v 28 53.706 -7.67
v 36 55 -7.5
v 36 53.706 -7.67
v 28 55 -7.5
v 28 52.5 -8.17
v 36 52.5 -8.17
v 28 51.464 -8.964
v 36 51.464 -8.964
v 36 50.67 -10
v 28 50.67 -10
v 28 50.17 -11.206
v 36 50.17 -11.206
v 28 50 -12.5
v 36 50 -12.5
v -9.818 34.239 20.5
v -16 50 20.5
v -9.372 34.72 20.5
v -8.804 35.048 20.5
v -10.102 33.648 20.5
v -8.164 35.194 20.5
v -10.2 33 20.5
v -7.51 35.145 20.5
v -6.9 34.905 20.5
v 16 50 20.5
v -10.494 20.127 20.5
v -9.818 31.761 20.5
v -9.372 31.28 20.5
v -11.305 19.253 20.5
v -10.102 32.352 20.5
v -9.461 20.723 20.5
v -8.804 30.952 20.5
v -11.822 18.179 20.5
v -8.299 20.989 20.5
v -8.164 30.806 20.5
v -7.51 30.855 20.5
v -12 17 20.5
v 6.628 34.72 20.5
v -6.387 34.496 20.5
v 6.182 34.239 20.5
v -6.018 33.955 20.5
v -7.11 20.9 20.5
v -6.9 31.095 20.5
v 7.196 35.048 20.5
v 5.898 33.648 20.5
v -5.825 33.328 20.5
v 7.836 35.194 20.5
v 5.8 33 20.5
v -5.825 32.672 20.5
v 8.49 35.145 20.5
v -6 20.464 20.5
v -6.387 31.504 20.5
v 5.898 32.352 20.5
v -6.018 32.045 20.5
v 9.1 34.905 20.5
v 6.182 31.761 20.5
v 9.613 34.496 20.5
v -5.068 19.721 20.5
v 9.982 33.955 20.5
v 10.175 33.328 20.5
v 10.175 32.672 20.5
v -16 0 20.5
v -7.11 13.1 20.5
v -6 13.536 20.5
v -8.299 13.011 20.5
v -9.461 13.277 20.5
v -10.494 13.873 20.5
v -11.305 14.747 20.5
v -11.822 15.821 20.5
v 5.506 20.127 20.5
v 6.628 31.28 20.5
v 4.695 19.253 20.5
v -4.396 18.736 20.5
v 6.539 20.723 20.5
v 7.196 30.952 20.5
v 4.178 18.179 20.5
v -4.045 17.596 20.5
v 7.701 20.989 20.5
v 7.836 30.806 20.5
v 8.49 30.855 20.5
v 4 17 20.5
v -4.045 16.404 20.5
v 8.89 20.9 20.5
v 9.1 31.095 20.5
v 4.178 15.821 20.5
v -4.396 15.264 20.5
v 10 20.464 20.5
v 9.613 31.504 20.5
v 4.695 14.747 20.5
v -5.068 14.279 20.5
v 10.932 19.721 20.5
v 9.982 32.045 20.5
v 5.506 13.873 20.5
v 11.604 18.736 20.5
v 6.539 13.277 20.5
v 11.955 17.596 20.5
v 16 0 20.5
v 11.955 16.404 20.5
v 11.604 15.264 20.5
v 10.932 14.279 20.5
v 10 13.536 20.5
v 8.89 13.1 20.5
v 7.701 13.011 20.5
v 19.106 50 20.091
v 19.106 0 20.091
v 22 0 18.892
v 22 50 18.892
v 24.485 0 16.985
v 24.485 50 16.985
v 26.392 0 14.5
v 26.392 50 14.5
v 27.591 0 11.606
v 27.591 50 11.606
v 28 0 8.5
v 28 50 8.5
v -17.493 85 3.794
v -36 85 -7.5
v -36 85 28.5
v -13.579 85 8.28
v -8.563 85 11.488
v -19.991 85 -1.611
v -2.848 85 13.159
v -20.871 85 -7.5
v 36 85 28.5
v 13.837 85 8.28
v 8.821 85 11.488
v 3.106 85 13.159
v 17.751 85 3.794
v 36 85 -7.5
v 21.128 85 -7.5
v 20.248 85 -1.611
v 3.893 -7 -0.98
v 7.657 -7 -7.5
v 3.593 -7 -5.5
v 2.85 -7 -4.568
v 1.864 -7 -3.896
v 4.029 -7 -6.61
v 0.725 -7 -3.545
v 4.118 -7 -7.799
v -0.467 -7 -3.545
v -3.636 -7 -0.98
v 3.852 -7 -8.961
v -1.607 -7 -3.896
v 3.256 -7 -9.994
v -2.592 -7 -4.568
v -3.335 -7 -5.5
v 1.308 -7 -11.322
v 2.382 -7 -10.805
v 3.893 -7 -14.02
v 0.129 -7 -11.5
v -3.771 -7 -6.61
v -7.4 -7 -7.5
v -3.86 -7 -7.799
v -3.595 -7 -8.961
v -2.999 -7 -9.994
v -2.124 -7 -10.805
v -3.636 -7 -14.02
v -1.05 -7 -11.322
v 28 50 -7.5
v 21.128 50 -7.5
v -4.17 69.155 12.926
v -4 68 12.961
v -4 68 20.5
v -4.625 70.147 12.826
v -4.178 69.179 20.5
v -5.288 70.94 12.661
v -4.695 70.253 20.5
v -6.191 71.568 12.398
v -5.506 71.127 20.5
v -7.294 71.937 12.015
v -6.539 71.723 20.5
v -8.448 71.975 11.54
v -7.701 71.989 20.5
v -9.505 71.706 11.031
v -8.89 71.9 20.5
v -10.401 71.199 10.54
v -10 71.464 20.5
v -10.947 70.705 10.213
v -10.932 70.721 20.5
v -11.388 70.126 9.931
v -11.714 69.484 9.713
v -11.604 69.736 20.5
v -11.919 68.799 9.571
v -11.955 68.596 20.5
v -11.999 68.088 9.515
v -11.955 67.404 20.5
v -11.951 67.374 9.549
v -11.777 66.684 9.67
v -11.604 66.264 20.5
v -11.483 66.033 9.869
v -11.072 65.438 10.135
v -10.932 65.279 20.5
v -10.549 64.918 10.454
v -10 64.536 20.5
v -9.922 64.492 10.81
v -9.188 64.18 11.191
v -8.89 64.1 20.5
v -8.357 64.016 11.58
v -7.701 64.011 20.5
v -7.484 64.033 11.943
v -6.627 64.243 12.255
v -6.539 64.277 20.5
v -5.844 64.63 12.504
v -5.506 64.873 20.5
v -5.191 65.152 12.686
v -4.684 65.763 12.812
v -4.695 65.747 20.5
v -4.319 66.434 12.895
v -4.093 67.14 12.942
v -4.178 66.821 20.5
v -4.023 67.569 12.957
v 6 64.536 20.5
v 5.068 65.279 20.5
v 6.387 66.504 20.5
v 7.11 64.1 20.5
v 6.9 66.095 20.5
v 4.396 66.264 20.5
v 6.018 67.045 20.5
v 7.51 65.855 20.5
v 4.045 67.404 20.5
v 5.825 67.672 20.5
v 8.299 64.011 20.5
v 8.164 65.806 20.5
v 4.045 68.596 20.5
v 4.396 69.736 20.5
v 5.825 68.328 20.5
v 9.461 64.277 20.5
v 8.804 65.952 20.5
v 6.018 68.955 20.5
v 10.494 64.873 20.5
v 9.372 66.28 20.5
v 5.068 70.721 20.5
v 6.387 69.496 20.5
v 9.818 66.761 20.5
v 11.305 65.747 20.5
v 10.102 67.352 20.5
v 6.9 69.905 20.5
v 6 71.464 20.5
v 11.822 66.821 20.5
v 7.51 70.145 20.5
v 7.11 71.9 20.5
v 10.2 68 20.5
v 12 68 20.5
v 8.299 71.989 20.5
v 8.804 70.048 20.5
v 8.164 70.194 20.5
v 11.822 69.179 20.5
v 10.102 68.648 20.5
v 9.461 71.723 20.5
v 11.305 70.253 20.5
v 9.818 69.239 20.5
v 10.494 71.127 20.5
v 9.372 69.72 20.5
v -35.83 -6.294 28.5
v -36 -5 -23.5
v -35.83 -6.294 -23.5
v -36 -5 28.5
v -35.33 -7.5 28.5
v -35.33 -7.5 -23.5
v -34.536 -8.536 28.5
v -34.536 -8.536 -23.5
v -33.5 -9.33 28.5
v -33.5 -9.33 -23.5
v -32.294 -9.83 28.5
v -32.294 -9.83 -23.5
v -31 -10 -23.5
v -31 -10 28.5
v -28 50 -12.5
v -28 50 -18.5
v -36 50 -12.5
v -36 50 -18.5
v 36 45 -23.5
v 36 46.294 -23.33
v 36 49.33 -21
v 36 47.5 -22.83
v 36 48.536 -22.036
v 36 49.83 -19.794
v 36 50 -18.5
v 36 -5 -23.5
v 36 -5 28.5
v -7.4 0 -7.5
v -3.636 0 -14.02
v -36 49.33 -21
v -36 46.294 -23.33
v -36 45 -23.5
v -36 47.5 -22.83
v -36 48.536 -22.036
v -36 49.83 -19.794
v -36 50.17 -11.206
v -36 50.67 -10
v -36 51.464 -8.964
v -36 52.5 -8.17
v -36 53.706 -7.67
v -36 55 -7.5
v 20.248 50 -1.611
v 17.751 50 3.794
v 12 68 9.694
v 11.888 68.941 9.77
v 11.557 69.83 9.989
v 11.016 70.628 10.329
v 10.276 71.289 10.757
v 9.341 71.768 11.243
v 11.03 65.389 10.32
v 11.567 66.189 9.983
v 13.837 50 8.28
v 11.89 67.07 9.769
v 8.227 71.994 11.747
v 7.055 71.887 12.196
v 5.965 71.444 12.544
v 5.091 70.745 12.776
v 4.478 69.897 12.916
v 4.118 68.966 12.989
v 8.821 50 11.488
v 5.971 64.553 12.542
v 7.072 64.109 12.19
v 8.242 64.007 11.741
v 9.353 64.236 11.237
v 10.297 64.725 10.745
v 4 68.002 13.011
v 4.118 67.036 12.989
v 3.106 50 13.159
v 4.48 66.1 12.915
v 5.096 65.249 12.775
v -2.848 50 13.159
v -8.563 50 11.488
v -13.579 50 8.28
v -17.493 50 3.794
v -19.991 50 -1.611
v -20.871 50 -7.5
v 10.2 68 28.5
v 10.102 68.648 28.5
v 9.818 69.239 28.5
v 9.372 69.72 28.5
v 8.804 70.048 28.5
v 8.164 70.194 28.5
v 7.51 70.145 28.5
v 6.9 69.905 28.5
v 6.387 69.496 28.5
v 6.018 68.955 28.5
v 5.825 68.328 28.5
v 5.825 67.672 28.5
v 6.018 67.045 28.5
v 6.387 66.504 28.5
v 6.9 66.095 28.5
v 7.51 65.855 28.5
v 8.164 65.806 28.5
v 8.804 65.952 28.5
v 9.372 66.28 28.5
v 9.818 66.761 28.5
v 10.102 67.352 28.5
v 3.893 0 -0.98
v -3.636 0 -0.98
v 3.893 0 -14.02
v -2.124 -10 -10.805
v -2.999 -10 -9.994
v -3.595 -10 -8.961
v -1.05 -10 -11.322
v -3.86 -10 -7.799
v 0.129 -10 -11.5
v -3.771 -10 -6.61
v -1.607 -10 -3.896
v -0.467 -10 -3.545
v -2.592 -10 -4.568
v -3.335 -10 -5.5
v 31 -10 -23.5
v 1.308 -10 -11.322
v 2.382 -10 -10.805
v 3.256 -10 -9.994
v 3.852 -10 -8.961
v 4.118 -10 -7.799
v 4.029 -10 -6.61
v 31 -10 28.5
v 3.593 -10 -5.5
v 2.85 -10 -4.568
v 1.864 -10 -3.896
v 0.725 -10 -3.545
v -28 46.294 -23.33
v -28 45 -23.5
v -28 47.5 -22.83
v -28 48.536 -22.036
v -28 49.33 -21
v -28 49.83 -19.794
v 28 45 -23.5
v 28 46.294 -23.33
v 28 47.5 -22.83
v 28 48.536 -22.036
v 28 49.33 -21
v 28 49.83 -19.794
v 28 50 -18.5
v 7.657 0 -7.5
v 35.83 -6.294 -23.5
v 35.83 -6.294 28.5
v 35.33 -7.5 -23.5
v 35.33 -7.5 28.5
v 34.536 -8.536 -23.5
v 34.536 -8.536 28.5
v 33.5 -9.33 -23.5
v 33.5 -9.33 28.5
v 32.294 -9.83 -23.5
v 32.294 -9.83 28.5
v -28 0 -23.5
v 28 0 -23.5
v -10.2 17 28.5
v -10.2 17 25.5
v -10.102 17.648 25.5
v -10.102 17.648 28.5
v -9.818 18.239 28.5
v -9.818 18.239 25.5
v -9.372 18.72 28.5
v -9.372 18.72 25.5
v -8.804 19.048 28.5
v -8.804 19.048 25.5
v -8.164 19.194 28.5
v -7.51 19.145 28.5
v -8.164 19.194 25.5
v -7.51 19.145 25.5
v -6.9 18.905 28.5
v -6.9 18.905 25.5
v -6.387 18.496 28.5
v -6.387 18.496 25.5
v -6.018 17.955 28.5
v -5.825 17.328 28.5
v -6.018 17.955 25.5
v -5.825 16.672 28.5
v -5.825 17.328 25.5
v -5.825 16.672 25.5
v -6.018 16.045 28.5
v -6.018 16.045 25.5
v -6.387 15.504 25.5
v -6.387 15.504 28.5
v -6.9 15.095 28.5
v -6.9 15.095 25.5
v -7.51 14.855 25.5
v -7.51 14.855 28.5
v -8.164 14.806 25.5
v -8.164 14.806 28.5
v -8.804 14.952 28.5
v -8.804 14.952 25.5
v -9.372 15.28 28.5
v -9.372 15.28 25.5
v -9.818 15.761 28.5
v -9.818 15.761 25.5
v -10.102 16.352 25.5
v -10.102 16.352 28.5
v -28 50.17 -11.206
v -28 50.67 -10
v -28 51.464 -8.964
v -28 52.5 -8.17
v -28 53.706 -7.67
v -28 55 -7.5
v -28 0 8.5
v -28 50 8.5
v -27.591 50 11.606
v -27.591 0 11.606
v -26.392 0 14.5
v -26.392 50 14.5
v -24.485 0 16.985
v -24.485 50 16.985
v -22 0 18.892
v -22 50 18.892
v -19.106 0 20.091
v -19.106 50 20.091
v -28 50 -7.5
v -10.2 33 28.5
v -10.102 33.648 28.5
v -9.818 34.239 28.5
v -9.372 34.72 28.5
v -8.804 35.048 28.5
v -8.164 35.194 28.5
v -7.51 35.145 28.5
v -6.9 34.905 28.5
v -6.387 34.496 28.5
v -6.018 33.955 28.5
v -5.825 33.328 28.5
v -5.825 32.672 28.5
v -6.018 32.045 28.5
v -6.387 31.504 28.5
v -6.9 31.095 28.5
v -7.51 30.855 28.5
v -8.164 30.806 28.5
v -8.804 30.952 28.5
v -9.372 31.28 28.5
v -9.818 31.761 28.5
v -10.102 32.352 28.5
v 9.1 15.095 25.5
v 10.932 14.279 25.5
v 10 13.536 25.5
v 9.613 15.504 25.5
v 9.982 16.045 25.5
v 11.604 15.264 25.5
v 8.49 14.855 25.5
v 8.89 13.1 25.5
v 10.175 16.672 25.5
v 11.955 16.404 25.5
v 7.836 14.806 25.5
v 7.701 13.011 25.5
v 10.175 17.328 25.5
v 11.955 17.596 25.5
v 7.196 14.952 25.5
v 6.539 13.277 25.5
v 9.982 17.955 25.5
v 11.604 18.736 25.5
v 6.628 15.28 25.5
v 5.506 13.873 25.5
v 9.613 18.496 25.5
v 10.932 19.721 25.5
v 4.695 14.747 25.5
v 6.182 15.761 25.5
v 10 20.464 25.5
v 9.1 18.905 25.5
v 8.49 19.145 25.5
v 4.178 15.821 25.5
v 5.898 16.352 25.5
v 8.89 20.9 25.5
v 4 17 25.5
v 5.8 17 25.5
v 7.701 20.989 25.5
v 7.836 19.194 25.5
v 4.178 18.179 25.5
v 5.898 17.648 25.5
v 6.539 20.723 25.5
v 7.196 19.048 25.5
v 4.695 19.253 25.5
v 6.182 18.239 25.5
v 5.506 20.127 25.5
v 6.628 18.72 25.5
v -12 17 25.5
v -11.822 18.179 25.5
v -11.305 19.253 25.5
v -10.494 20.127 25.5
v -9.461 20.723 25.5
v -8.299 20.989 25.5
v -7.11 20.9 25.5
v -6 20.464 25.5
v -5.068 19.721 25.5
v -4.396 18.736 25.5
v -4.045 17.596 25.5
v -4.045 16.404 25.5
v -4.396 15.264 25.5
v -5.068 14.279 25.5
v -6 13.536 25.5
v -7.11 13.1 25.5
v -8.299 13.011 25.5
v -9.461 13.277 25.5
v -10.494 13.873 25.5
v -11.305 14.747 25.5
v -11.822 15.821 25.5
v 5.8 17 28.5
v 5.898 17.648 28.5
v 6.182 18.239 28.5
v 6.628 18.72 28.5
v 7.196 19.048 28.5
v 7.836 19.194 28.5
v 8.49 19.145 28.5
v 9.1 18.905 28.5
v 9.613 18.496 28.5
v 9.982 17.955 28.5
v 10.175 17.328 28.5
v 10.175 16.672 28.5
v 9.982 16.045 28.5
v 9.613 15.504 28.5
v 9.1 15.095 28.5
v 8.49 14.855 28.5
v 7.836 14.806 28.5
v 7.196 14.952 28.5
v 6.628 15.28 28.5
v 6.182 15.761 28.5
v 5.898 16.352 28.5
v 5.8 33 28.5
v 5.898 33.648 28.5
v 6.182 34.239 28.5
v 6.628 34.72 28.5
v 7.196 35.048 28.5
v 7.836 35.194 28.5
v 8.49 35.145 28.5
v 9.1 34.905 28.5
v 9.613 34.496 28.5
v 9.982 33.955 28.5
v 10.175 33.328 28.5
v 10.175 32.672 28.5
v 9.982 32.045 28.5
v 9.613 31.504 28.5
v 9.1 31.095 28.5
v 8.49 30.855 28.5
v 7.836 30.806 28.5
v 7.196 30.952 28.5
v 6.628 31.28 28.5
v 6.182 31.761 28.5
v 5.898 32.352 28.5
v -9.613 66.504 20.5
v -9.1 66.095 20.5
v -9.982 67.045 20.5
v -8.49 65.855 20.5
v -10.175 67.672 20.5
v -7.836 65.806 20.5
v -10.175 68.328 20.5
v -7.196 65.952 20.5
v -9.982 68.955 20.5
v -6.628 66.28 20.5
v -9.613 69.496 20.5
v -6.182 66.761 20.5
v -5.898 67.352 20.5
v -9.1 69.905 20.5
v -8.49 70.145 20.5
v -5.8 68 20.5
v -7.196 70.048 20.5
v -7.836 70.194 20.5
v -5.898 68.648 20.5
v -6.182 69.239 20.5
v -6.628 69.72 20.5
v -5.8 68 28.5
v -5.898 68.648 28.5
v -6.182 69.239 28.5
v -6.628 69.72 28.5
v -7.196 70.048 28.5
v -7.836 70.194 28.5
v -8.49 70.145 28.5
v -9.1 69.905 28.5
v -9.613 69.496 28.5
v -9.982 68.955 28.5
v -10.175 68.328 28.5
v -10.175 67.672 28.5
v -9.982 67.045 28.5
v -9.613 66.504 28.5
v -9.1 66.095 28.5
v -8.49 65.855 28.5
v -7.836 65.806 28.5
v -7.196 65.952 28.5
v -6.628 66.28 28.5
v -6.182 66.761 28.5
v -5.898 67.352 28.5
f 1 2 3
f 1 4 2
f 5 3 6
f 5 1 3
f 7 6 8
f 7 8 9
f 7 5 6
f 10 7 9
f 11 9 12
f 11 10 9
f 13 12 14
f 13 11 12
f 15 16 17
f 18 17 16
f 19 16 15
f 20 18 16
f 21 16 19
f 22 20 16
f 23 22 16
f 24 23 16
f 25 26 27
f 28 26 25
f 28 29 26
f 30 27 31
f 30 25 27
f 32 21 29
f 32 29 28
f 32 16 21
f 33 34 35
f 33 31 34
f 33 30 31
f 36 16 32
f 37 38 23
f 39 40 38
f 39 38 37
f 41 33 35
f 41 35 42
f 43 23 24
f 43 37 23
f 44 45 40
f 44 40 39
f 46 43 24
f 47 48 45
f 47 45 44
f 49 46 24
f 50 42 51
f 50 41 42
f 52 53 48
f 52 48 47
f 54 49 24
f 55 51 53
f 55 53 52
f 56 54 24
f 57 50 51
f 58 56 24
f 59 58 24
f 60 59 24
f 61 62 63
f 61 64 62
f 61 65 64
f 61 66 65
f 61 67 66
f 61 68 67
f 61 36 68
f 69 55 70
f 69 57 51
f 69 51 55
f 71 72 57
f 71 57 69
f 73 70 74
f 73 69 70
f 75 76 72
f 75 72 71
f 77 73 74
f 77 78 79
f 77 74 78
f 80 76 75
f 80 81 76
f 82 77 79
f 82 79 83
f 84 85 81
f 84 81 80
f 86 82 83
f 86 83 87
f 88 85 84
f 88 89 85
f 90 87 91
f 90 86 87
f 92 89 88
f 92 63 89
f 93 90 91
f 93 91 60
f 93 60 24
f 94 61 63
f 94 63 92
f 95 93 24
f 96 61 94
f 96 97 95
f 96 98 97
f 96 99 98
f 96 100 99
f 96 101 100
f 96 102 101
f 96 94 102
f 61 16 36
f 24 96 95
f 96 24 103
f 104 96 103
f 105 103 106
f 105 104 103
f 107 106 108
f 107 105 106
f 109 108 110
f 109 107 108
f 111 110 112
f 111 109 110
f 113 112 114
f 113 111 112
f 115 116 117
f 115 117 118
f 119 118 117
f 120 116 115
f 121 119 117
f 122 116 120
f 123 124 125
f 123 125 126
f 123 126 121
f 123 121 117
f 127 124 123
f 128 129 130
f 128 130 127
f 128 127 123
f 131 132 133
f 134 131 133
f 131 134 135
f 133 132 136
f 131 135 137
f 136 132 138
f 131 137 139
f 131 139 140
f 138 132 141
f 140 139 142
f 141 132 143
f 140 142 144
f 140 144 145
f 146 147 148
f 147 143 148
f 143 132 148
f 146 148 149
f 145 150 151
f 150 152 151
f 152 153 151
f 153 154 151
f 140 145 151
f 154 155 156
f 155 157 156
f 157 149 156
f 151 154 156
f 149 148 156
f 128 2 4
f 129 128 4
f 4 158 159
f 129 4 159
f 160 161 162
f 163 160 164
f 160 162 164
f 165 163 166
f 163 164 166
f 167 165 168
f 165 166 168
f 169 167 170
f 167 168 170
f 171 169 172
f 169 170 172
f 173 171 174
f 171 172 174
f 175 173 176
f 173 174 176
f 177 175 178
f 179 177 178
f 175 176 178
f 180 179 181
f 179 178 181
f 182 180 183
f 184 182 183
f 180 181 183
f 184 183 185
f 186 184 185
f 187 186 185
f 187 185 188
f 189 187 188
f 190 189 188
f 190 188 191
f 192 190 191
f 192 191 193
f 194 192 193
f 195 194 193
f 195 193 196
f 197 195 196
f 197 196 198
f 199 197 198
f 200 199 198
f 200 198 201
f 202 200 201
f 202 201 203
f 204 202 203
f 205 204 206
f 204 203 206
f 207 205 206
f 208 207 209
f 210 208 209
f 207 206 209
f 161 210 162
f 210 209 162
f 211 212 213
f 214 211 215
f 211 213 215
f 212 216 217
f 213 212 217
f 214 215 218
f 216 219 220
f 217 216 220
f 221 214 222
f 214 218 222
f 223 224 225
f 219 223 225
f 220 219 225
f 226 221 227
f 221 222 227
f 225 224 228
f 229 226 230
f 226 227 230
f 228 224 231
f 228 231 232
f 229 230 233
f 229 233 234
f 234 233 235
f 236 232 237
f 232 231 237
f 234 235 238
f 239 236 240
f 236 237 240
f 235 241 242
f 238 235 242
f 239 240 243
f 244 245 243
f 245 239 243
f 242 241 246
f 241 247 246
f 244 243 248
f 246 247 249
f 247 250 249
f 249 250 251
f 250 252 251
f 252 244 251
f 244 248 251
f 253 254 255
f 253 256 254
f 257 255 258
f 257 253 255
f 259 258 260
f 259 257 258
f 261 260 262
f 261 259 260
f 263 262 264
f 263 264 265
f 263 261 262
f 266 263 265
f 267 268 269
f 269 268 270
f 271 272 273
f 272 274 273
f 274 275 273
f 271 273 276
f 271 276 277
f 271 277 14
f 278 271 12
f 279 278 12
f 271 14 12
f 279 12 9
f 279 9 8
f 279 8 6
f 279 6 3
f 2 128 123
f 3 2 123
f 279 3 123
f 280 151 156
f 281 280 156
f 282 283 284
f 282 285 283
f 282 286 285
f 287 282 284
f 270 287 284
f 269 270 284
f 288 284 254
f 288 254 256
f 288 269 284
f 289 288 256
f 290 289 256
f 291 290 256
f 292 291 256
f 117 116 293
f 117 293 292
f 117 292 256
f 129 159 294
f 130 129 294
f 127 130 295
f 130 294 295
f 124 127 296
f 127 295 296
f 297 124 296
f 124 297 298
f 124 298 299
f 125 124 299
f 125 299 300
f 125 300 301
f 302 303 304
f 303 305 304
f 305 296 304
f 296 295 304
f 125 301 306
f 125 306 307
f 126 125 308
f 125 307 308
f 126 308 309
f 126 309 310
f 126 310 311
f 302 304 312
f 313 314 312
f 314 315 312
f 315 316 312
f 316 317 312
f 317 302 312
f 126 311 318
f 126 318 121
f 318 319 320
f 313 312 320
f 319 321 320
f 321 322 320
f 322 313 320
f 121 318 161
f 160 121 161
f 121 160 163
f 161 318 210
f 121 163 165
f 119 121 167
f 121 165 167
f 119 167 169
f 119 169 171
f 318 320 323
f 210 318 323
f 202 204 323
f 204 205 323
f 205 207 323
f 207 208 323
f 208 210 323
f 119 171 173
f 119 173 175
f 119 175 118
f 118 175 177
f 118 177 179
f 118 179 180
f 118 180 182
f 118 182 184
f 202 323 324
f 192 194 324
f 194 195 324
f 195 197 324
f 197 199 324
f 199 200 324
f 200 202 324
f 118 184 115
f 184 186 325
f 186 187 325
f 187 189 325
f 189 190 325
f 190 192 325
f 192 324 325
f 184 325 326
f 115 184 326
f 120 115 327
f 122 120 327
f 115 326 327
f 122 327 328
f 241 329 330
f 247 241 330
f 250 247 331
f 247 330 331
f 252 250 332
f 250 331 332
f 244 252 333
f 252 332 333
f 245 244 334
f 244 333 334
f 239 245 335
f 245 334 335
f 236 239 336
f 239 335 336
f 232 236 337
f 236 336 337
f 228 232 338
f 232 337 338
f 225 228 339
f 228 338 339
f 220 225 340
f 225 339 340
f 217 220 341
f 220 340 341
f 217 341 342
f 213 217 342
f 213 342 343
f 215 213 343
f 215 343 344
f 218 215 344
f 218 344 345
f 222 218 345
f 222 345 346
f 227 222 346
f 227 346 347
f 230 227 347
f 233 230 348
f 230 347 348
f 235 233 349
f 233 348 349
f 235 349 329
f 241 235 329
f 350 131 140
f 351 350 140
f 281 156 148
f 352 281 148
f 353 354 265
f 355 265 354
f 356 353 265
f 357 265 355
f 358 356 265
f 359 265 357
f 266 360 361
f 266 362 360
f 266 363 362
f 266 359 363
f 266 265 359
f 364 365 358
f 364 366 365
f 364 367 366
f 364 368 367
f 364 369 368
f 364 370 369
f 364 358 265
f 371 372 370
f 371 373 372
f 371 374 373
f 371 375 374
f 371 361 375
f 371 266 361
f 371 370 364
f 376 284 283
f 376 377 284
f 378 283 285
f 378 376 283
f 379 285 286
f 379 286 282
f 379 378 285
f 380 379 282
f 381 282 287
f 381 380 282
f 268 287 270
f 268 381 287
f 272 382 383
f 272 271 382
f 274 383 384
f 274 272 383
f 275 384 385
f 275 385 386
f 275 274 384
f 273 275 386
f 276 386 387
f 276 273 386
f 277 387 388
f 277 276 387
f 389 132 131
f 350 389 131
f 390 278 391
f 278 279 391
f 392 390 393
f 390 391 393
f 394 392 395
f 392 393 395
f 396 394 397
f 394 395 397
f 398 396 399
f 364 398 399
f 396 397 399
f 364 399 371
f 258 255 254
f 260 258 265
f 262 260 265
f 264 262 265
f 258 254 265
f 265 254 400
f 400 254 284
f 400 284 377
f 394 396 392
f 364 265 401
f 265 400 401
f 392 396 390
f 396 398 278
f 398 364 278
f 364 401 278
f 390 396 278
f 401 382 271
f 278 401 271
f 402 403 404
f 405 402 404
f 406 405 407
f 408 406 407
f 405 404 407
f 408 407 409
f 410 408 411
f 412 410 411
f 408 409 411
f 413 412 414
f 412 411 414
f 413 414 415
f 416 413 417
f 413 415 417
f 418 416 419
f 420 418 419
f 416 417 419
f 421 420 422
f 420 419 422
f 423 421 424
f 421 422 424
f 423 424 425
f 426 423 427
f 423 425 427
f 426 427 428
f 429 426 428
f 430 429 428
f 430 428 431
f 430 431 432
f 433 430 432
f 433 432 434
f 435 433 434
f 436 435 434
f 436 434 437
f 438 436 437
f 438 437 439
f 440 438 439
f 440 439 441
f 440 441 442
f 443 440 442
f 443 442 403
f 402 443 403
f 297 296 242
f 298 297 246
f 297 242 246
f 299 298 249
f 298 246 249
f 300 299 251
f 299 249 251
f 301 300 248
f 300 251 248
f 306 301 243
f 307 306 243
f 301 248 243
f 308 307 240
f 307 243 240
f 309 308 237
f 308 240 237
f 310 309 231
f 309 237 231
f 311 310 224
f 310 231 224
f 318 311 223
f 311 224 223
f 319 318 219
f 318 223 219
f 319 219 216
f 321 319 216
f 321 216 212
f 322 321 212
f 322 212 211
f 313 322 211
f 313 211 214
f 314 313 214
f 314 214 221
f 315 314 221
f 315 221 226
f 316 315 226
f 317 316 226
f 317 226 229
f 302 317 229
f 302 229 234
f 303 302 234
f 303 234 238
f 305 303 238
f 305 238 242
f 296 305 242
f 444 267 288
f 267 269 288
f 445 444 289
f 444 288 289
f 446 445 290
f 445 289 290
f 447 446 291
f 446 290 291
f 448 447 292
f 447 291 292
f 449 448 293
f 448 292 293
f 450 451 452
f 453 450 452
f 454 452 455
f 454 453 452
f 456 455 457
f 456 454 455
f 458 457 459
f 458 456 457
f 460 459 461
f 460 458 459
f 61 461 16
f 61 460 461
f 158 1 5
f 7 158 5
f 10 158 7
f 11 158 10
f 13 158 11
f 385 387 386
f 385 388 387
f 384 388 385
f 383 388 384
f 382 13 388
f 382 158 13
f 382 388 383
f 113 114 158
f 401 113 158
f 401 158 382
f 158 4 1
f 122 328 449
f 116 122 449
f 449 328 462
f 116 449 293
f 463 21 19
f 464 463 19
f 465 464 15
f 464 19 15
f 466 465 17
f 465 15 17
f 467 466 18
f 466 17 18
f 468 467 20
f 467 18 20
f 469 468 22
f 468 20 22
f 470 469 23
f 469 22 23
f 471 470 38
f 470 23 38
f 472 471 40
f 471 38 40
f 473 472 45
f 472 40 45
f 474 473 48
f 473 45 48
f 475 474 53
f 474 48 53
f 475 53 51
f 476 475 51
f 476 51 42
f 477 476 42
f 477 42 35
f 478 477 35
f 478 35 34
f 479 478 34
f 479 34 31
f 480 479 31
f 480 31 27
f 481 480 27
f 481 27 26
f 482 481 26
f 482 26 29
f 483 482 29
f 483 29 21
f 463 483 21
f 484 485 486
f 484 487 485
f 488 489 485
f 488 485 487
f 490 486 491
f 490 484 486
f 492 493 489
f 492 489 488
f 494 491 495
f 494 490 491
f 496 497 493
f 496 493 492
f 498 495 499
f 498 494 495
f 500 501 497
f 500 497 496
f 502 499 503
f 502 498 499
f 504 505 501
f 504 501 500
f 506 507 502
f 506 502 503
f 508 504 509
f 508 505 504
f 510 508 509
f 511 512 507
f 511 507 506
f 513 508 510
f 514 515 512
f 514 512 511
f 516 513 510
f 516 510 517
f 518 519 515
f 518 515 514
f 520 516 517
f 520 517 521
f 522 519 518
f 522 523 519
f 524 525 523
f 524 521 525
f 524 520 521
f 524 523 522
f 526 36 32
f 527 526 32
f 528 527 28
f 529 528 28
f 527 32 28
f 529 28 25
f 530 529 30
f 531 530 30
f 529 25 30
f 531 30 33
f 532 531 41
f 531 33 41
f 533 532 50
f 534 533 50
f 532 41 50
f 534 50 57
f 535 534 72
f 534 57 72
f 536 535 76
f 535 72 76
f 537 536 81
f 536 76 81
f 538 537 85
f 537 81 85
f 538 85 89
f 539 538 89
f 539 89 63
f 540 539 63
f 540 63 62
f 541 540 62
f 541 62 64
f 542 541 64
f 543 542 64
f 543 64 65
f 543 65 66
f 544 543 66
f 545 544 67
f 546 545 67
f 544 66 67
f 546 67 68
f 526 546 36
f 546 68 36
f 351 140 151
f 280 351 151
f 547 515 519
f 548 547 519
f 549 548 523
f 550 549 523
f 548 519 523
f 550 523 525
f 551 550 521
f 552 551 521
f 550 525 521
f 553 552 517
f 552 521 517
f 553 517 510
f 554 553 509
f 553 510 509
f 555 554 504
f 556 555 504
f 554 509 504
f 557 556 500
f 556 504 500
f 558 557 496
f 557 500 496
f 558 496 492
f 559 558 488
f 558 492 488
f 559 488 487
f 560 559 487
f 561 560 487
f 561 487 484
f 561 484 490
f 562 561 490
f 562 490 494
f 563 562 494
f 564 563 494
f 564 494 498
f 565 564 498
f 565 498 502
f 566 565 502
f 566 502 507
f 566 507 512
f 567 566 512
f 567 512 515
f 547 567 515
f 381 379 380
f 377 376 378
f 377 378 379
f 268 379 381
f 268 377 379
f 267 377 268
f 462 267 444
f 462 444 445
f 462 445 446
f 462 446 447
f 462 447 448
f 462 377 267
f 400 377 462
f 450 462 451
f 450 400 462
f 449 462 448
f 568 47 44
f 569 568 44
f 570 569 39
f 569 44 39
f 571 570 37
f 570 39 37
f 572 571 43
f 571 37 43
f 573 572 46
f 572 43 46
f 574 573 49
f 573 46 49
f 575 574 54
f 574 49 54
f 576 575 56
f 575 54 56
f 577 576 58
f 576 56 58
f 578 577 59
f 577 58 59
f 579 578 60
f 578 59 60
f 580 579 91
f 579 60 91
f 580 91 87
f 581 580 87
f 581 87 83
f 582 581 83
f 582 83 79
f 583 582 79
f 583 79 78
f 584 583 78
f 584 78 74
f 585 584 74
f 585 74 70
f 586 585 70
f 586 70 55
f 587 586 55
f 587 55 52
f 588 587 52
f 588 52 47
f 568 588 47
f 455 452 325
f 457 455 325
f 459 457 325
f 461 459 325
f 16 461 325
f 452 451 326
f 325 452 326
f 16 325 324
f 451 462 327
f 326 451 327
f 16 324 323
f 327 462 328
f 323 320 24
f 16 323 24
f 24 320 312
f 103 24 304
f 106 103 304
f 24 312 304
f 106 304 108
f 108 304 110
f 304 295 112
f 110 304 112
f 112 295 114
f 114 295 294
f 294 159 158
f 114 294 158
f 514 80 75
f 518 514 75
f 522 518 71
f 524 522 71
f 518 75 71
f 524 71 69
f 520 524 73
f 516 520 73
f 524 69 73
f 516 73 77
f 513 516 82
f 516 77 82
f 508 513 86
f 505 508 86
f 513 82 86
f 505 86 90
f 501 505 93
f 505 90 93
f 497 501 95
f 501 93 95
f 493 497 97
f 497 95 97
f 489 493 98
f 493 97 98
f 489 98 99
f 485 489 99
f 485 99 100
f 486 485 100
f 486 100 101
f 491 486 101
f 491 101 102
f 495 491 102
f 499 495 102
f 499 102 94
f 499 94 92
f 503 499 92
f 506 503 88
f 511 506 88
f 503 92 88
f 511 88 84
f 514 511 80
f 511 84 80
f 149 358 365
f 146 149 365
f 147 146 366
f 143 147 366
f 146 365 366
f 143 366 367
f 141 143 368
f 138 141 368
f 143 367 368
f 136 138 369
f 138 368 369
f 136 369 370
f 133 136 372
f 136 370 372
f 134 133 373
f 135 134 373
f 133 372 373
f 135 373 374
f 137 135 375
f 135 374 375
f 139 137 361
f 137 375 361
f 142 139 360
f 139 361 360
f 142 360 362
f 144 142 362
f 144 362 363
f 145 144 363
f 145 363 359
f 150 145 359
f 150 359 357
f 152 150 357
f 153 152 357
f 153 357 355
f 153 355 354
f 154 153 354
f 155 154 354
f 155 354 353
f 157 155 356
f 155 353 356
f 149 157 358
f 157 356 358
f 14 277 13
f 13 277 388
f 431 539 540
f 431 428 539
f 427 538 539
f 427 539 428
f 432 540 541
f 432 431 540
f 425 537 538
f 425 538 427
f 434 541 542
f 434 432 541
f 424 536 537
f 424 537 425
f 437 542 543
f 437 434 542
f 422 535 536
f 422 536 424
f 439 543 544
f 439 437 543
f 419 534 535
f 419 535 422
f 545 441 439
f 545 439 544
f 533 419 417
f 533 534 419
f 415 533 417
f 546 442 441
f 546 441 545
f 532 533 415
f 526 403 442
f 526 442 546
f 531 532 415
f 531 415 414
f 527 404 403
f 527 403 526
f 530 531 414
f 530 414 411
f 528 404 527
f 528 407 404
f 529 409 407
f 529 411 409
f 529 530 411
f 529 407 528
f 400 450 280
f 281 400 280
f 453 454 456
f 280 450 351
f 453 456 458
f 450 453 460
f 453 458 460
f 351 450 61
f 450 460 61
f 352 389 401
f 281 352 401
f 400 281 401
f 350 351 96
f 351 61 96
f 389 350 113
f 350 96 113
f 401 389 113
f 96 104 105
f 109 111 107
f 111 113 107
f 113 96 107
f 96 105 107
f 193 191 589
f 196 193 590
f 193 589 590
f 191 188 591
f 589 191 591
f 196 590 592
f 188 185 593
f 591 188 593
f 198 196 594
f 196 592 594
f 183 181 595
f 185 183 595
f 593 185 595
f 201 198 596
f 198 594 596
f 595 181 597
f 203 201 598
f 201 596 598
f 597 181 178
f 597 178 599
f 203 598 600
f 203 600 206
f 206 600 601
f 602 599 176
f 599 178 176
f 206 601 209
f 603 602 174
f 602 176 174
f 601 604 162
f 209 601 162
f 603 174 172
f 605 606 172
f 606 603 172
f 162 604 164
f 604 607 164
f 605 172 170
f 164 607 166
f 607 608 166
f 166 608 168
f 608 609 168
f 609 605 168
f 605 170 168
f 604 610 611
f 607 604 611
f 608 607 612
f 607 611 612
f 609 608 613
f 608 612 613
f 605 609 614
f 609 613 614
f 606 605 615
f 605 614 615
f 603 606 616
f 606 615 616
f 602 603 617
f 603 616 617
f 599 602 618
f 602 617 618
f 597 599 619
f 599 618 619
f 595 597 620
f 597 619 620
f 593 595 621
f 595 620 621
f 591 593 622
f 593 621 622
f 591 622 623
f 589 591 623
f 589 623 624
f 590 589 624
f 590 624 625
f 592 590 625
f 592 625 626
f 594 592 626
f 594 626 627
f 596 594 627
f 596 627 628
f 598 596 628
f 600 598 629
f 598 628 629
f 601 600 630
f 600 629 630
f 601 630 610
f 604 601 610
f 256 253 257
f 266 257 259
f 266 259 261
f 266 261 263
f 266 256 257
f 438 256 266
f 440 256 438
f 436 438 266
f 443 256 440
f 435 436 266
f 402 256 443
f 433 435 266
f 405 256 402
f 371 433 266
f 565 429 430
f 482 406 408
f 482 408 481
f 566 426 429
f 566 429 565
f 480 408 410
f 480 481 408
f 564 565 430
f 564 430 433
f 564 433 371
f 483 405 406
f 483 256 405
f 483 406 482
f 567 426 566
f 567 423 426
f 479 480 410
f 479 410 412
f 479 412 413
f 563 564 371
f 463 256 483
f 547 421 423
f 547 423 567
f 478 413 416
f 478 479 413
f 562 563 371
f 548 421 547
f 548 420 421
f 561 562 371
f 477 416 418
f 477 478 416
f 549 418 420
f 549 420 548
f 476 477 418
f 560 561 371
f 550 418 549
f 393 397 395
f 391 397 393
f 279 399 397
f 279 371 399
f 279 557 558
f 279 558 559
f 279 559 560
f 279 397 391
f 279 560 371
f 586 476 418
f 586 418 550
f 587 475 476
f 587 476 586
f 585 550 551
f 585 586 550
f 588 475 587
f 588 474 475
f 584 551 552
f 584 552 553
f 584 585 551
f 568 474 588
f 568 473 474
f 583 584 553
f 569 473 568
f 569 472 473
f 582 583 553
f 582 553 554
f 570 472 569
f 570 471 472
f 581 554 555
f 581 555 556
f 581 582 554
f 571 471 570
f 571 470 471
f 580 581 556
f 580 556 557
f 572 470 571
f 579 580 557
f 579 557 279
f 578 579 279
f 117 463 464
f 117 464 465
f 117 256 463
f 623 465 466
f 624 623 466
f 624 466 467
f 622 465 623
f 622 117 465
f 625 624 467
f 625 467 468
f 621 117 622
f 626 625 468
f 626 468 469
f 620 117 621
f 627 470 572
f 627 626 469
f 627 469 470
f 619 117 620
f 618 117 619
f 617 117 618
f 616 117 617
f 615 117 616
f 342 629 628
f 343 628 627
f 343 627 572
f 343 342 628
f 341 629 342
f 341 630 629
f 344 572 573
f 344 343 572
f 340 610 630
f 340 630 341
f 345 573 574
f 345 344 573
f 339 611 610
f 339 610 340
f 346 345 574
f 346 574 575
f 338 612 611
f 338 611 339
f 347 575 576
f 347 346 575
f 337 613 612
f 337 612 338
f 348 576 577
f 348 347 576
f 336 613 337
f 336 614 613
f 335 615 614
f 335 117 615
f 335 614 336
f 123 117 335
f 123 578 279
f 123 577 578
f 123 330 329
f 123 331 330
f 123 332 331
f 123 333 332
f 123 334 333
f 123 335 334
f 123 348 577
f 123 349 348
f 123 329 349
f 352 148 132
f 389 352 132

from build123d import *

# Parameters (mm, degrees)
BOSS_EXTRUDE1_DEPTH = 50
BOSS_EXTRUDE2_DEPTH = 35
SKETCH4_R           = 2.2
CUT_EXTRUDE1_DEPTH  = 35
SKETCH5_R           = 4
CUT_EXTRUDE2_DEPTH  = 5
SKETCH6_R           = 4
CUT_EXTRUDE3_DEPTH  = 34
SKETCH7_R           = 4
SKETCH7_R_2         = 2.2
BOSS_EXTRUDE3_DEPTH = 8
SKETCH8_W           = 72
SKETCH8_H           = 52
BOSS_EXTRUDE4_DEPTH = 10
FILLET1_R           = 5
CUT_EXTRUDE5_DEPTH  = 28
SKETCH11_R          = 11.145843878
SKETCH11_R_2        = 4
BOSS_EXTRUDE6_DEPTH = 3


with BuildPart() as part:
    # Sketch1 → Boss-Extrude1 (new body)
    with BuildSketch(Plane(origin=(0, 0, 0), x_dir=(1, 0, 0), z_dir=(0, 1, 0))):
        with BuildLine():
            Line((-28, 23.5), (-28, -8.5))
            ThreePointArc((-28, -8.5), (-24.485281374, -16.985281374), (-16, -20.5))
            Line((-16, -20.5), (16, -20.5))
            ThreePointArc((16, -20.5), (24.485281374, -16.985281374), (28, -8.5))
            Line((28, -8.5), (28, 23.5))
            Line((28, 23.5), (36, 23.5))
            Line((36, 23.5), (36, 15.5))
            Line((36, 15.5), (36, -8.5))
            Line((36, -8.5), (36, -28.5))
            Line((36, -28.5), (16, -28.5))
            Line((16, -28.5), (-16, -28.5))
            Line((-16, -28.5), (-36, -28.5))
            Line((-36, -28.5), (-36, -8.5))
            Line((-36, -8.5), (-36, 15.5))
            Line((-36, 15.5), (-36, 23.5))
            Line((-36, 23.5), (-28, 23.5))
        make_face()
    extrude(amount=BOSS_EXTRUDE1_DEPTH)

    # Sketch3 → Boss-Extrude2 (add)
    with BuildSketch(Plane(origin=(0, 50, 0), x_dir=(1, 0, 0), z_dir=(0, 1, 0))):
        with BuildLine():
            Line((-36, 7.5), (-36, -8.5))
            Line((-36, -8.5), (-36, -28.5))
            Line((-36, -28.5), (-16, -28.5))
            Line((-16, -28.5), (16, -28.5))
            Line((16, -28.5), (36, -28.5))
            Line((36, -28.5), (36, -8.5))
            Line((36, -8.5), (36, 7.5))
            Line((36, 7.5), (28, 7.5))
            Line((28, 7.5), (21.128428342, 7.5))
            ThreePointArc((21.128428342, 7.5), (0.128823476, -13.371176524), (-20.87078139, 7.5))
            Line((-20.87078139, 7.5), (-28, 7.5))
            Line((-28, 7.5), (-36, 7.5))
        make_face()
    extrude(amount=BOSS_EXTRUDE2_DEPTH)

    # Sketch4 → Cut-Extrude1 (cut)
    with BuildSketch(Plane(origin=(0, 0, 20.5), x_dir=(-1, 0, 0), z_dir=(0, 0, -1))):
        with Locations((8, 33)):
            Circle(SKETCH4_R)
        with Locations((-8, 33)):
            Circle(SKETCH4_R)
        with Locations((-8, 17)):
            Circle(SKETCH4_R)
        with Locations((8, 17)):
            Circle(SKETCH4_R)
    extrude(amount=-CUT_EXTRUDE1_DEPTH, mode=Mode.SUBTRACT)

    # Sketch5 → Cut-Extrude2 (cut)
    with BuildSketch(Plane(origin=(0, 0, 20.5), x_dir=(-1, 0, 0), z_dir=(0, 0, -1))):
        with Locations((-8, 17)):
            Circle(SKETCH5_R)
        with Locations((8, 17)):
            Circle(SKETCH5_R)
    extrude(amount=-CUT_EXTRUDE2_DEPTH, mode=Mode.SUBTRACT)

    # Sketch6 → Cut-Extrude3 (cut)
    with BuildSketch(Plane.XY.offset(28.5)):
        with Locations((-8, 68)):
            Circle(SKETCH6_R)
        with Locations((8, 68)):
            Circle(SKETCH6_R)
    extrude(amount=-CUT_EXTRUDE3_DEPTH, mode=Mode.SUBTRACT)

    # Sketch7 → Boss-Extrude3 (add)
    # profile 1 of 2: a face of its own
    with BuildSketch(Plane.XY.offset(28.5)):
        with Locations((-8, 68)):
            Circle(SKETCH7_R)
        with Locations((-8, 68)):
            Circle(SKETCH7_R_2, mode=Mode.SUBTRACT)
    # profile 2 of 2: a face of its own
    with BuildSketch(Plane.XY.offset(28.5)):
        with Locations((8, 68)):
            Circle(SKETCH7_R)
        with Locations((8, 68)):
            Circle(SKETCH7_R_2, mode=Mode.SUBTRACT)
    extrude(amount=-BOSS_EXTRUDE3_DEPTH)

    # Sketch8 → Boss-Extrude4 (add)
    with BuildSketch(Plane.XZ):
        with Locations((0, 2.5)):
            Rectangle(SKETCH8_W, SKETCH8_H)
    extrude(amount=BOSS_EXTRUDE4_DEPTH)

    # Fillet1
    fillet1_edges = [part.edges().sort_by_distance(p)[0] for p in [
        (-36, -10, 2.5),
        (36, -10, 2.5),
        (32, 50, -23.5),
        (32, 50, -7.5),
        (-32, 50, -23.5),
        (-32, 50, -7.5),
    ]]
    fillet(fillet1_edges, radius=FILLET1_R)

    # Sketch9 → Cut-Extrude5 (cut)
    with BuildSketch(Plane.XZ.offset(10)):
        Polygon((-3.635500279, -0.98), (-7.399824034, -7.5), (7.657470986, -7.5), (3.893147231, -0.98), align=None)
        Polygon((7.657470986, -7.5), (-7.399824034, -7.5), (-3.635500279, -14.02), (3.893147231, -14.02), align=None)
    extrude(amount=-CUT_EXTRUDE5_DEPTH, mode=Mode.SUBTRACT)

    # Sketch11 → Boss-Extrude6 (add)
    with BuildSketch(Plane(origin=(0, -10, 0), x_dir=(-1, 0, 0), z_dir=(0, -1, 0))):
        with Locations((-0.128823476, 7.5)):
            Circle(SKETCH11_R)
        with Locations(Location((-0.128823476, 7.5, 0), (0, 0, 90))):
            Circle(SKETCH11_R_2, mode=Mode.SUBTRACT)
    extrude(amount=-BOSS_EXTRUDE6_DEPTH)


solid = part.part
